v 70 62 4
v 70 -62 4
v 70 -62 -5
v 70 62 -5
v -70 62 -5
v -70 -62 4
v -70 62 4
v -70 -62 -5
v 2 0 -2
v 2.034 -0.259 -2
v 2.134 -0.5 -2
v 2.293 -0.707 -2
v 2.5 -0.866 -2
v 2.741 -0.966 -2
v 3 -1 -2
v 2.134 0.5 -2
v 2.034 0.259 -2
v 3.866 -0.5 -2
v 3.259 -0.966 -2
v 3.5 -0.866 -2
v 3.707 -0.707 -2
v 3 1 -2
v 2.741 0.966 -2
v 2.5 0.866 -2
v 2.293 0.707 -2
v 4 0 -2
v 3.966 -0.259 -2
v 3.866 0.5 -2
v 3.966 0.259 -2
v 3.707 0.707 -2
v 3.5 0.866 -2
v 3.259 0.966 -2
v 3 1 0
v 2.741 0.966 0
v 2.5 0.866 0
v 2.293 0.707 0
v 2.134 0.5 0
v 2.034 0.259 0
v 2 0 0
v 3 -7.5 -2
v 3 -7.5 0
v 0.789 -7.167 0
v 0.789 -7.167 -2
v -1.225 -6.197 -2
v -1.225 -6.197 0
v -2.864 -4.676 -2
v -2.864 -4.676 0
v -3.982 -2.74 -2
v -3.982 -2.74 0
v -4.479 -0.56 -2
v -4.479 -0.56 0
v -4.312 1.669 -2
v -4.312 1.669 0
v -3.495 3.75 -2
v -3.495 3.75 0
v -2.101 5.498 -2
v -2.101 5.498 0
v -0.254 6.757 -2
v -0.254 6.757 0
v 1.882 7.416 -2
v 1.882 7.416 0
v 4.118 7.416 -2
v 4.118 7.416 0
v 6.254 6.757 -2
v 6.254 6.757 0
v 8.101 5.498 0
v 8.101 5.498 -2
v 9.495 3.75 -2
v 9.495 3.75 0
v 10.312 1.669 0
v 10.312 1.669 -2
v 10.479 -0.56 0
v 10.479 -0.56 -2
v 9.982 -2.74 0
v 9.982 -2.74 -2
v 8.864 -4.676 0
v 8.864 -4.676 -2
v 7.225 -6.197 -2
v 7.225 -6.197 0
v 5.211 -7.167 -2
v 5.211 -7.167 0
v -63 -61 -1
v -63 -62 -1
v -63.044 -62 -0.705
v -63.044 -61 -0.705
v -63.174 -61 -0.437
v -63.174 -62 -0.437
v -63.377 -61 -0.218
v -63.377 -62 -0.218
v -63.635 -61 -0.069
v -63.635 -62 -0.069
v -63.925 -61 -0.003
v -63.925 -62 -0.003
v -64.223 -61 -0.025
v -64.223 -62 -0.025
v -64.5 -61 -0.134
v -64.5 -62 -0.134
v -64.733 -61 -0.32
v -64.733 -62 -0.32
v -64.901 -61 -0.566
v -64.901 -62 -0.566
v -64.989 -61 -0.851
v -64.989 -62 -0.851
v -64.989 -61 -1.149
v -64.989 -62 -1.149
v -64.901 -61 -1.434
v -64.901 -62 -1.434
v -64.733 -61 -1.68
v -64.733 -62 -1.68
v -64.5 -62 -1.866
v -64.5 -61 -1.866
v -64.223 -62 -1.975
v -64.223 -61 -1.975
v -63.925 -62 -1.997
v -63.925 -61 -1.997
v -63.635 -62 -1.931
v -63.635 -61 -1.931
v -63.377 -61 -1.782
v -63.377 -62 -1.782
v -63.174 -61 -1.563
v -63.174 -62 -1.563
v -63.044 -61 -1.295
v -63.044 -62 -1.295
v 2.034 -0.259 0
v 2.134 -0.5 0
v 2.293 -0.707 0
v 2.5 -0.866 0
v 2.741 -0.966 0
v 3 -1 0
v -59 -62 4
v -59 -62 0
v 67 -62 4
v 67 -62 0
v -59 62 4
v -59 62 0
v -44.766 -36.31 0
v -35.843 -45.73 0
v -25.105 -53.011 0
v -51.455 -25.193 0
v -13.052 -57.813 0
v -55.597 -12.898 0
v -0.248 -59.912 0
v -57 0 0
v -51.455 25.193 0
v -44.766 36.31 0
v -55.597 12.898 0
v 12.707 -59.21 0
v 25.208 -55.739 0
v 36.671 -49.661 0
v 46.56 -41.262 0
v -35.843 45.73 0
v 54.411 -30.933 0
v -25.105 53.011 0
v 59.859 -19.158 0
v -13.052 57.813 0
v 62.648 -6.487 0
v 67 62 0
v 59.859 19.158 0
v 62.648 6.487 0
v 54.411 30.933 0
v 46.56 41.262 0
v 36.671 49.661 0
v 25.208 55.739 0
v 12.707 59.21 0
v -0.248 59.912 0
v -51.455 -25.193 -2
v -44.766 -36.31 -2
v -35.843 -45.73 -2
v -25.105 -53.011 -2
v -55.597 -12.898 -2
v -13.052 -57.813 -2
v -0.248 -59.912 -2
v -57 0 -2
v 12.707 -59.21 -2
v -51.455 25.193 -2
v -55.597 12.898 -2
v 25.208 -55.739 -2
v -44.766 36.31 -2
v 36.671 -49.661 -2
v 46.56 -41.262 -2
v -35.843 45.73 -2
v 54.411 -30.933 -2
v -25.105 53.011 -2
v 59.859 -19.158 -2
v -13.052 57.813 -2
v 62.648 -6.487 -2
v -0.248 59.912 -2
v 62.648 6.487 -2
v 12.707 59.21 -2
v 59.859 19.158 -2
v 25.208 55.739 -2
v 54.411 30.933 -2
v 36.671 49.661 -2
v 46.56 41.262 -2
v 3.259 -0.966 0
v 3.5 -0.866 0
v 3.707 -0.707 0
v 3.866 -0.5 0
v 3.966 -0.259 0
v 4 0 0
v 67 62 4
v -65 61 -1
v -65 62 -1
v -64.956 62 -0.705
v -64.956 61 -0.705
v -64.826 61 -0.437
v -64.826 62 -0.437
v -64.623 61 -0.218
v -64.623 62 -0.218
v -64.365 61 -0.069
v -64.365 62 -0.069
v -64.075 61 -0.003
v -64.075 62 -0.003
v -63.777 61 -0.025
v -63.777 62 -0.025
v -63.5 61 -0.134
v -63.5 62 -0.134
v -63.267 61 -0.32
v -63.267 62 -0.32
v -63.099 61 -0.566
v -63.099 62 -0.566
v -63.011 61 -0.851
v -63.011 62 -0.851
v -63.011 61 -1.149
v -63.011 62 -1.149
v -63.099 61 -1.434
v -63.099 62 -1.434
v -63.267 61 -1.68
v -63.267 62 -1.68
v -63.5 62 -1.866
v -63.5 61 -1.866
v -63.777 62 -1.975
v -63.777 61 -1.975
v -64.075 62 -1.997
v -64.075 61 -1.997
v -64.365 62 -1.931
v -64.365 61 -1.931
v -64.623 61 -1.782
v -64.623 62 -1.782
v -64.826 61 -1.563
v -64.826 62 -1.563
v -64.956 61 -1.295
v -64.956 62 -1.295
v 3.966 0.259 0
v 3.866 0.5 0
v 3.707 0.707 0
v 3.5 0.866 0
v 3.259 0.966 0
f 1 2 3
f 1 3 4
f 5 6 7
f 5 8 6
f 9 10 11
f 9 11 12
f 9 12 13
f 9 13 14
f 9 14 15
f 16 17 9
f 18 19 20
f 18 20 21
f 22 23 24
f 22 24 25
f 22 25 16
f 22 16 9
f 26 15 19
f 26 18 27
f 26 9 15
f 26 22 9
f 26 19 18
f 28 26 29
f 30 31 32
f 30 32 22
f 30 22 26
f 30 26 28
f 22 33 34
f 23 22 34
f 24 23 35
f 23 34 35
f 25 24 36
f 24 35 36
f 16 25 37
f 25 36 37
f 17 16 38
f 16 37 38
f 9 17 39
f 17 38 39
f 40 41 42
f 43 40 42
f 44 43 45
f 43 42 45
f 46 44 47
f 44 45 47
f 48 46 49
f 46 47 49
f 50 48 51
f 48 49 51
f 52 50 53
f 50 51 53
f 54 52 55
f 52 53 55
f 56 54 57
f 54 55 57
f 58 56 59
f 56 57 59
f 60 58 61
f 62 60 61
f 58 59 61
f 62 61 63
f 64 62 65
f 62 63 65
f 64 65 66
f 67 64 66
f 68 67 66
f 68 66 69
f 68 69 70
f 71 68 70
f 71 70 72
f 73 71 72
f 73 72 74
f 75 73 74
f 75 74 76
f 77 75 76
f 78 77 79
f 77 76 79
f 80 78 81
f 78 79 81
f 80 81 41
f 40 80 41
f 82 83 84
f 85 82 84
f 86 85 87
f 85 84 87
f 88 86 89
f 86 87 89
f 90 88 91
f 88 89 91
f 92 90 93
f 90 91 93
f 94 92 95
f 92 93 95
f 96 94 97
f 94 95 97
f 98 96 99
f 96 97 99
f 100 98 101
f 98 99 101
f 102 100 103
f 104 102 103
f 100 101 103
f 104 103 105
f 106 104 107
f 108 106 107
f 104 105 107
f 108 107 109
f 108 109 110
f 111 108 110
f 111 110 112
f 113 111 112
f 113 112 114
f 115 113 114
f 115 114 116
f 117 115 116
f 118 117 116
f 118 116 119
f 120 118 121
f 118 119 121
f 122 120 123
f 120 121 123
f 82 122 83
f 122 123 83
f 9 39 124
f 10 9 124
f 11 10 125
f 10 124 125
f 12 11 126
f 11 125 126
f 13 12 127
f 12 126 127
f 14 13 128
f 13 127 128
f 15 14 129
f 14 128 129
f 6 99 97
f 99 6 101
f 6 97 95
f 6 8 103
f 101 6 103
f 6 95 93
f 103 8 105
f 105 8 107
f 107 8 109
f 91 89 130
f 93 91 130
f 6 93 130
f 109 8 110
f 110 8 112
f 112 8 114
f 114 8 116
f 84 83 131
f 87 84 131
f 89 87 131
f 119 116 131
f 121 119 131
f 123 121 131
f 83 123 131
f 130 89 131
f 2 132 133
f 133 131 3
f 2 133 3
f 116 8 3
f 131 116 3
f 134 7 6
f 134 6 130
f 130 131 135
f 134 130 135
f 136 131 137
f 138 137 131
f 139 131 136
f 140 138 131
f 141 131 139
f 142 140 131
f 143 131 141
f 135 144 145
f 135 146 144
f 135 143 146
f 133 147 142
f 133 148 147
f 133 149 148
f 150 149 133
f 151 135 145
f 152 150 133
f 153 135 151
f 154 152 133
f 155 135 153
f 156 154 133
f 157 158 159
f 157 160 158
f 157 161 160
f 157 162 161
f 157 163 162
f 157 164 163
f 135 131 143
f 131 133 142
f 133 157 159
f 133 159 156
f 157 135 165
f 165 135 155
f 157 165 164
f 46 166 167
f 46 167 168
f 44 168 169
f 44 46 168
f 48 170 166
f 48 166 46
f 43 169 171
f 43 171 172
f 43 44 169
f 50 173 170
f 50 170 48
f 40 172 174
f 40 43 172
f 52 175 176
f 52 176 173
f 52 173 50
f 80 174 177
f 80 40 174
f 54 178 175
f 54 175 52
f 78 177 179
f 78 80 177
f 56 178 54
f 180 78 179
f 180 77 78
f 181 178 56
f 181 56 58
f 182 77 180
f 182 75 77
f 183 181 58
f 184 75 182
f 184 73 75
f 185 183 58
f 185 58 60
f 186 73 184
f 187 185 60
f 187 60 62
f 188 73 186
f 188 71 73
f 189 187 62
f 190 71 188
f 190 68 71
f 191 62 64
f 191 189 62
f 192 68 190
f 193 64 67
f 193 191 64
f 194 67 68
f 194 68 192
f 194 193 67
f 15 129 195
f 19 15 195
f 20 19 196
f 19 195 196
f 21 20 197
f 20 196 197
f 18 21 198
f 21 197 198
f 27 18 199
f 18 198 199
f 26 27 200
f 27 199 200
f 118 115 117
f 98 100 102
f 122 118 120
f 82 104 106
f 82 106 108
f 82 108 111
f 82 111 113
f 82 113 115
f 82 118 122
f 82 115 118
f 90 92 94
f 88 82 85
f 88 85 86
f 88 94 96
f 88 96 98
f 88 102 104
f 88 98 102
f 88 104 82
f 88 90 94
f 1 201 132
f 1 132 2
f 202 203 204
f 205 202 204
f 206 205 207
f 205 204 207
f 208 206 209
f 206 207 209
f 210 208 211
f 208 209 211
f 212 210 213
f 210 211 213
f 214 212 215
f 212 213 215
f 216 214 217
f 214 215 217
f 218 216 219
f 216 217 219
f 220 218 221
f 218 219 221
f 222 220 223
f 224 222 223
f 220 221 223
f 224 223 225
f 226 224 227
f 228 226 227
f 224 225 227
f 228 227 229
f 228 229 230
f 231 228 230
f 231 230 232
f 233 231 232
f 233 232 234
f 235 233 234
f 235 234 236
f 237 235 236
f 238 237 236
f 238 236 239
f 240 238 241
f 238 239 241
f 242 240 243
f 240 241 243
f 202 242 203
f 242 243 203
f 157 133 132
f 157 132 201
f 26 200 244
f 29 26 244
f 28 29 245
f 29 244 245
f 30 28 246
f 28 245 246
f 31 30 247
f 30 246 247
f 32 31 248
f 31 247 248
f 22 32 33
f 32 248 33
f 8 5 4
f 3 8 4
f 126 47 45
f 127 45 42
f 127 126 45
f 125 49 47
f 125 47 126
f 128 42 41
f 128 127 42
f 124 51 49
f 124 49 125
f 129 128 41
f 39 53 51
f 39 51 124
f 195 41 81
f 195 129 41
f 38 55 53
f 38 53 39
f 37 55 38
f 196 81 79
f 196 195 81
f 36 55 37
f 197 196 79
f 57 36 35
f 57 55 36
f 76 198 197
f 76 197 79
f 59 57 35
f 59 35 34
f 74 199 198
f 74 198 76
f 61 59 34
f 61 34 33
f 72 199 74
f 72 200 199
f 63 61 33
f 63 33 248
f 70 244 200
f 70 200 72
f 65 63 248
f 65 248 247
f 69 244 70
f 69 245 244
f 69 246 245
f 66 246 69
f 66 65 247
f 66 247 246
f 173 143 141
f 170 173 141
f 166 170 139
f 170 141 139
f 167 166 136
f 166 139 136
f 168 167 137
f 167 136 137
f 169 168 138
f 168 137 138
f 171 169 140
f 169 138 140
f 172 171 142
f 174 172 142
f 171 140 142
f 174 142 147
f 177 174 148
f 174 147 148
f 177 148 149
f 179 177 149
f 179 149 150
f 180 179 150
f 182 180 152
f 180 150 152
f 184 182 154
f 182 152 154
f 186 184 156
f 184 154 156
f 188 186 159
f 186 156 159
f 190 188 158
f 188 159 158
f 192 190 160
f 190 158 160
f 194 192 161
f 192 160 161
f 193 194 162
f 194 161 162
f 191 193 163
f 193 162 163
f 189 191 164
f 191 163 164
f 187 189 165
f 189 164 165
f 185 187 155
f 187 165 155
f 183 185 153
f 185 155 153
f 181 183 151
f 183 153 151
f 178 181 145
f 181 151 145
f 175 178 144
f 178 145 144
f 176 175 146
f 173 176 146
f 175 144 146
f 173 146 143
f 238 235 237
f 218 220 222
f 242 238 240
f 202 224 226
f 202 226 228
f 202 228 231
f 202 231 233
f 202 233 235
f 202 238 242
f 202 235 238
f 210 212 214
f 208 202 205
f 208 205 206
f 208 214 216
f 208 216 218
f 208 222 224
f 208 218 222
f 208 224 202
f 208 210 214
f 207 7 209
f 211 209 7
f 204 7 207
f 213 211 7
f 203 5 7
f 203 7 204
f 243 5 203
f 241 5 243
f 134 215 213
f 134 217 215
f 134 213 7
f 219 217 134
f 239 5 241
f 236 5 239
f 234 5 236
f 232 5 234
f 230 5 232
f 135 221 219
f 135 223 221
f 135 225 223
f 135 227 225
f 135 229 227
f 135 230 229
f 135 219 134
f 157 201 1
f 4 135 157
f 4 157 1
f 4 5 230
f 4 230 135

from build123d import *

# Parameters (mm, degrees)
F0_W      = 140
F0_H      = 124
F1_DEPTH  = 5
F2_W      = 11
F2_H      = 124
F2_W_2    = 3
F3_DEPTH  = 4
F5_DEPTH  = 2
F6_DEPTH  = 2
F7_R      = 1
F8_DEPTH  = 1
F9_R      = 1
F10_DEPTH = 1


with BuildPart() as f1:
    # F0 (on Top) → F1 (new body)
    with BuildSketch(Plane.XY):
        Rectangle(F0_W, F0_H)
    extrude(amount=-F1_DEPTH)

    # F2 (on face) → F3 (join)
    with BuildSketch(Plane.XY):
        with Locations((-64.5, 0)):
            Rectangle(F2_W, F2_H)
        with Locations((68.5, 0)):
            Rectangle(F2_W_2, F2_H)
    extrude(amount=F3_DEPTH)

    # F4 (on face) → F5 (cut)
    with BuildSketch(Plane.XY):
        with BuildLine():
            ThreePointArc((3, 7.5), (8.3033008589, 5.3033008589), (10.5, 0))
            Line((10.5, 0), (63, 0))
            ThreePointArc((63, 0), (45.4264068712, 42.4264068712), (3, 60))
            Line((3, 60), (3, 7.5))
        make_face()
        with BuildLine():
            Line((63, 0), (10.5, 0))
            ThreePointArc((10.5, 0), (8.3033008589, -5.3033008589), (3, -7.5))
            Line((3, -7.5), (3, -60))
            ThreePointArc((3, -60), (45.4264068712, -42.4264068712), (63, 0))
        make_face()
        with BuildLine():
            ThreePointArc((-4.5, 0), (-2.3033008589, 5.3033008589), (3, 7.5))
            Line((3, 7.5), (3, 60))
            ThreePointArc((3, 60), (-39.4264068712, 42.4264068712), (-57, 0))
            Line((-57, 0), (-4.5, 0))
        make_face()
        with BuildLine():
            Line((3, -60), (3, -7.5))
            ThreePointArc((3, -7.5), (-2.3033008589, -5.3033008589), (-4.5, 0))
            Line((-4.5, 0), (-57, 0))
            ThreePointArc((-57, 0), (-39.4264068712, -42.4264068712), (3, -60))
        make_face()
    extrude(amount=-F5_DEPTH, mode=Mode.SUBTRACT)

    # F4 (on face) → F6 (cut)
    with BuildSketch(Plane.XY):
        with BuildLine():
            ThreePointArc((3, -1), (3.7071067812, -0.7071067812), (4, 0))
            Line((4, 0), (3, 0))
            Line((3, 0), (3, -1))
        make_face()
        with BuildLine():
            Line((3, -1), (3, 0))
            Line((3, 0), (2, 0))
            ThreePointArc((2, 0), (2.2928932188, -0.7071067812), (3, -1))
        make_face()
        with BuildLine():
            Line((2, 0), (3, 0))
            Line((3, 0), (3, 1))
            ThreePointArc((3, 1), (2.2928932188, 0.7071067812), (2, 0))
        make_face()
        with BuildLine():
            Line((3, 0), (4, 0))
            ThreePointArc((4, 0), (3.7071067812, 0.7071067812), (3, 1))
            Line((3, 1), (3, 0))
        make_face()
    extrude(amount=-F6_DEPTH, mode=Mode.SUBTRACT)

    # F7 (on face) → F8 (cut)
    with BuildSketch(Plane(origin=(0, 62, 0), x_dir=(-1, 0, 0), z_dir=(0, 1, 0))):
        with Locations((64, -1)):
            Circle(F7_R)
    extrude(amount=-F8_DEPTH, mode=Mode.SUBTRACT)

    # F9 (on face) → F10 (cut)
    with BuildSketch(Plane.XZ.offset(62)):
        with Locations((-64, -1)):
            Circle(F9_R)
    extrude(amount=-F10_DEPTH, mode=Mode.SUBTRACT)


solid = f1.part
